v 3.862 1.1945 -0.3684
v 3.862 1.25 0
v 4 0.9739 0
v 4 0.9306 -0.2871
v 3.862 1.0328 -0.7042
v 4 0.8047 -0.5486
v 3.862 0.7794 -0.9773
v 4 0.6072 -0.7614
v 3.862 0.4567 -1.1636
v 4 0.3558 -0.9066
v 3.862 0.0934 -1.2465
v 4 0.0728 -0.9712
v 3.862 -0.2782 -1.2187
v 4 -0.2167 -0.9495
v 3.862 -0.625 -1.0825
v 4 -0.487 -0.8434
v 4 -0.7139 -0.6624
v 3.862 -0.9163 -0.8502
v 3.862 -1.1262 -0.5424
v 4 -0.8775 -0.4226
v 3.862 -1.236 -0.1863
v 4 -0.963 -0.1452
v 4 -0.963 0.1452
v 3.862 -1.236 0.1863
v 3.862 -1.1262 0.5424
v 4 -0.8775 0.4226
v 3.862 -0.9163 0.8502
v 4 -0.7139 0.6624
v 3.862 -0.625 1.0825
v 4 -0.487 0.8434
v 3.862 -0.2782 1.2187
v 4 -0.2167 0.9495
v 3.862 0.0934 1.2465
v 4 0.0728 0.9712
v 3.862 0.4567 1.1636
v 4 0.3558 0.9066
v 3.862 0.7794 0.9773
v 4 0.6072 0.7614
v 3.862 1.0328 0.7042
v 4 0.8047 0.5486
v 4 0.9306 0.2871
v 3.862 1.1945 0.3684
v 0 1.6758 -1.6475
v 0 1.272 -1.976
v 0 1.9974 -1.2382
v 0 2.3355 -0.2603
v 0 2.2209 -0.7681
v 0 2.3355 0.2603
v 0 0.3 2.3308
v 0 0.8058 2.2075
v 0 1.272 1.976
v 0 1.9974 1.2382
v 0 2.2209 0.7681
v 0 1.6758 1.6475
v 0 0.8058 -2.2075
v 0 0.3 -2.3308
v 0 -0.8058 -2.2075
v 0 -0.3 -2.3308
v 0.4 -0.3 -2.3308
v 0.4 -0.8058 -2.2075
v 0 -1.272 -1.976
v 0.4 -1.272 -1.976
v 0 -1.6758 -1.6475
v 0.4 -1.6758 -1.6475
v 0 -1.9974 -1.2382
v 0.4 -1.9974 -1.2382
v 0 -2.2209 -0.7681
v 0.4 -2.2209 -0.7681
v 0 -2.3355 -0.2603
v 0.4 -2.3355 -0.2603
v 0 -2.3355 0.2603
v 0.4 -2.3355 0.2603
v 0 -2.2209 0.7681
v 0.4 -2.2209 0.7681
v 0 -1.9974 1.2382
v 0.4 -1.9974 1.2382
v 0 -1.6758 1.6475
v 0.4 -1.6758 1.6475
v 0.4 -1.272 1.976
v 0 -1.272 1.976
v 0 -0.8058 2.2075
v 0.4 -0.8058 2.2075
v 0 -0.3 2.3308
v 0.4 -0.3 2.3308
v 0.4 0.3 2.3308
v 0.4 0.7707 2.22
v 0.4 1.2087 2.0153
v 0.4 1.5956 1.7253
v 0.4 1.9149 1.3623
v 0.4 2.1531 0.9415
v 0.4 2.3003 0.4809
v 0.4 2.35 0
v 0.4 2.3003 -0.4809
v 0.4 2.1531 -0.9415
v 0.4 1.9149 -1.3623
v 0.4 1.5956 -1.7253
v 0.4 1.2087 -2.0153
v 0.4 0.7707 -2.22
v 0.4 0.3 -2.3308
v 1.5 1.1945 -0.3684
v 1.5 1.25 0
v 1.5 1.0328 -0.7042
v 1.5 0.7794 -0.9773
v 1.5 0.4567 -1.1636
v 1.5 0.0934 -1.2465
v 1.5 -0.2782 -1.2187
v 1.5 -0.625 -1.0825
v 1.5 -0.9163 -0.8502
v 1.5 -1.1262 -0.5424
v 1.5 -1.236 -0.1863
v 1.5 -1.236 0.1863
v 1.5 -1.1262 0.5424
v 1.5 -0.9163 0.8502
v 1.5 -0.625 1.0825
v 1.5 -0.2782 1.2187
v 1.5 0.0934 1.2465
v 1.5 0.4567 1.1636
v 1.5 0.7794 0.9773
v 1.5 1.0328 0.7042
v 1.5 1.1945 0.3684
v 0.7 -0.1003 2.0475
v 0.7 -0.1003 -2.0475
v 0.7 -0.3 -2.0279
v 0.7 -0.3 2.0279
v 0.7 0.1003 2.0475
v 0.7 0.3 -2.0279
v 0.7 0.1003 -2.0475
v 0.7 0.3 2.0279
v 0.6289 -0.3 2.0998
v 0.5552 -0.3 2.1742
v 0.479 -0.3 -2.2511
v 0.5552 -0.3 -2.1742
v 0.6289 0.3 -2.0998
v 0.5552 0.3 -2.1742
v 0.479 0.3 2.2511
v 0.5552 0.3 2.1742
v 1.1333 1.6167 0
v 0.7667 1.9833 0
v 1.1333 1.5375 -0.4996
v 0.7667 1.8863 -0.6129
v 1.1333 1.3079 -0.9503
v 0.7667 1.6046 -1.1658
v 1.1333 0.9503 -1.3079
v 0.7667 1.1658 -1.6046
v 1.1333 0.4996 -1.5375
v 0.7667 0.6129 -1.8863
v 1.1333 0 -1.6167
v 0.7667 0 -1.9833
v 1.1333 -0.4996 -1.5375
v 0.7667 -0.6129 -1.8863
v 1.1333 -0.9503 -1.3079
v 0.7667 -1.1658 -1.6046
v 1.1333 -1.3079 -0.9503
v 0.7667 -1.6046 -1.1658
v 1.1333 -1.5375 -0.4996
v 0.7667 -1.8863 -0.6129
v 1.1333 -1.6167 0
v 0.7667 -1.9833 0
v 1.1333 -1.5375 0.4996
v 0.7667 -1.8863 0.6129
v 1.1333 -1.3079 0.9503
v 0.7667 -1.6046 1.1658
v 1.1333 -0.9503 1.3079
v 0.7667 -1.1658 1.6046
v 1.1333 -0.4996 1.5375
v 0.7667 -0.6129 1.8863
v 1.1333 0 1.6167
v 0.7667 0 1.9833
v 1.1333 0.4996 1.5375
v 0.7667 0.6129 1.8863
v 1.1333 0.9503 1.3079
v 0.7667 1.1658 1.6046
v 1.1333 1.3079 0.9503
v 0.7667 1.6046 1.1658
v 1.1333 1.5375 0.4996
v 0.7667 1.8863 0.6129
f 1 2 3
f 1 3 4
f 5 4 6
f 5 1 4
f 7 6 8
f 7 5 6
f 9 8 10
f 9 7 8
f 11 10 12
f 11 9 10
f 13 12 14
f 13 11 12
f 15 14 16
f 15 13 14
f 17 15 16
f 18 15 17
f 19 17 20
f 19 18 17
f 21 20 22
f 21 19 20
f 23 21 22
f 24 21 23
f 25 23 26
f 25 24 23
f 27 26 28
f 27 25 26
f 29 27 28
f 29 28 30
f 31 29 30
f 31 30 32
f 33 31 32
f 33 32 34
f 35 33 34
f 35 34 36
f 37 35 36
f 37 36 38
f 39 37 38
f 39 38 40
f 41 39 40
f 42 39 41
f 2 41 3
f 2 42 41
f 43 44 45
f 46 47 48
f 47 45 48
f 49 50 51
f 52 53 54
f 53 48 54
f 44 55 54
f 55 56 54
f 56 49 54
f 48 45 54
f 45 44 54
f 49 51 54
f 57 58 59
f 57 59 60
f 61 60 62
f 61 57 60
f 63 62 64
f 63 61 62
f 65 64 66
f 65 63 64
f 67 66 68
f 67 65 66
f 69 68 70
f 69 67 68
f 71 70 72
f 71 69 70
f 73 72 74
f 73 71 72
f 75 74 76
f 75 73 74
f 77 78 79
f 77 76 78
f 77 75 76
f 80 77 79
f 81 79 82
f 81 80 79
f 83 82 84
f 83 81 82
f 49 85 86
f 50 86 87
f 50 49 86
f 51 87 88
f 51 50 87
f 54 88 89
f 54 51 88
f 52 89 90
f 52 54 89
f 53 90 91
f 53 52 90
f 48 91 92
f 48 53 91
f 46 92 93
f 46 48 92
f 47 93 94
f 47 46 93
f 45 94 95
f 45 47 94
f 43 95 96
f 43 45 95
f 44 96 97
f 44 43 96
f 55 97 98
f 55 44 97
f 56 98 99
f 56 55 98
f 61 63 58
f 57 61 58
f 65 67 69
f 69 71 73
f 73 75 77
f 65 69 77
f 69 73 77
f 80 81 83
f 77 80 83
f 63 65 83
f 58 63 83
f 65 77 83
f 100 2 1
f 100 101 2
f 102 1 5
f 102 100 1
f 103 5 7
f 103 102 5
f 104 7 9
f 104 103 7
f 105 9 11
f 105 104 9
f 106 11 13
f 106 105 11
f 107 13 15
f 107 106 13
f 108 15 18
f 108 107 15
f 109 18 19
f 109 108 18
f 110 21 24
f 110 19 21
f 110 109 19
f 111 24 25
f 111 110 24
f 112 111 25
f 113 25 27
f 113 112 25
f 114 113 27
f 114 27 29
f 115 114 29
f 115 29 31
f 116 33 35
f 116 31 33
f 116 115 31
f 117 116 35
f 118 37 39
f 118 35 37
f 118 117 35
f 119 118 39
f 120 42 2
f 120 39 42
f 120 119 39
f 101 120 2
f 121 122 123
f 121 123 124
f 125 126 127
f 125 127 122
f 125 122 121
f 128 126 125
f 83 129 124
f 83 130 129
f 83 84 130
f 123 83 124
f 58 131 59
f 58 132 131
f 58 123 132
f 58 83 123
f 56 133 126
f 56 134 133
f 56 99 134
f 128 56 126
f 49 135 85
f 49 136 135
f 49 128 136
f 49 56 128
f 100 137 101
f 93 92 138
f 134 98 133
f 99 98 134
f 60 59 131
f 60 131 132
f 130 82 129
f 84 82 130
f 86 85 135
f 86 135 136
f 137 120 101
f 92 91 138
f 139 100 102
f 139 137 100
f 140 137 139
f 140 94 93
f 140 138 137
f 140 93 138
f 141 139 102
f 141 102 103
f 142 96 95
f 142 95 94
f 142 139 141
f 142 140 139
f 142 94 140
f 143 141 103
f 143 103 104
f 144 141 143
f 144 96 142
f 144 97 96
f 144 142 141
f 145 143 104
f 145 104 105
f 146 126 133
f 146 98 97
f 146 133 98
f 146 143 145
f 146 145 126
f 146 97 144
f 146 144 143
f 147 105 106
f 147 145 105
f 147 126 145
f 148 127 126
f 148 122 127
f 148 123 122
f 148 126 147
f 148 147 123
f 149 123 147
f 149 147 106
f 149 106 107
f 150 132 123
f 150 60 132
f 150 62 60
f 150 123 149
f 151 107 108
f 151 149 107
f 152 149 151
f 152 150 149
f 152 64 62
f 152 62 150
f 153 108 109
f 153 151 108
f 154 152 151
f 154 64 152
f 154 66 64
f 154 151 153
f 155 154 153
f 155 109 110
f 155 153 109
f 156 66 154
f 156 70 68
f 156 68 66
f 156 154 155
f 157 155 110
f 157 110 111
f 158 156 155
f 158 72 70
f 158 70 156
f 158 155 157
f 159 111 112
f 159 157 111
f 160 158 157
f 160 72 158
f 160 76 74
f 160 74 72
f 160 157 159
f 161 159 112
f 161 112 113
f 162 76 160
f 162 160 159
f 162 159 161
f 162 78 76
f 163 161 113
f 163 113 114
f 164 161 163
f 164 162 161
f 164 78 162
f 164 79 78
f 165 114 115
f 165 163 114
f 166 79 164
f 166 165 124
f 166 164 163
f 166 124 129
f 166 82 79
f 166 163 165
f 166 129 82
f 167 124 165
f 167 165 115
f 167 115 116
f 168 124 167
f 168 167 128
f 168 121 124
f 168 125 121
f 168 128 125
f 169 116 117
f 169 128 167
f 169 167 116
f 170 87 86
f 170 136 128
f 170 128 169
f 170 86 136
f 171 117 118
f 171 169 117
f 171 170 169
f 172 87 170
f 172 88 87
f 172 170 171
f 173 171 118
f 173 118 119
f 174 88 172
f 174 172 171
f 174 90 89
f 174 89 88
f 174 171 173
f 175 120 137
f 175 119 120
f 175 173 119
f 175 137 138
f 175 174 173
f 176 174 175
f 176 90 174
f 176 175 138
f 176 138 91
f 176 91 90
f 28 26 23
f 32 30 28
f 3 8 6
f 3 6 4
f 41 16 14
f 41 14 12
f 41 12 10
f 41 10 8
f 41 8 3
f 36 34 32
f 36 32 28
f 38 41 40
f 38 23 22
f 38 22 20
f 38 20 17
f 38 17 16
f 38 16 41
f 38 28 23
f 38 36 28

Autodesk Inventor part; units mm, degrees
ref_plane "YZ Plane" through (0, 0, 0) normal (1, 0, 0) x (0, 1, 0)
ref_plane "XZ Plane" through (0, 0, 0) normal (0, 1, 0) x (-1, 0, 0)
sketch "Sketch1" plane through (0, 0, 0) normal (0, 0, 1) x (1, 0, 0)
  line L0 (0, 0) -> (4, 0)
  line L1 (4, 0) -> (4, 1.25)
  line L2 (4, 1.25) -> (2.4, 1.25)
  line L3 (2.4, 1.25) -> (2.1239, 1.25)
  line L4 (2.1239, 1.25) -> (1.5, 1.25)
  line L5 (1.5, 1.25) -> (0.4, 2.35)
  line L6 (0.4, 2.35) -> (0, 2.35)
  line L7 (0, 2.35) -> (0, 0)
  line L8 (2.4, 1.25) -> (1.5, 1.25) construction
  line L9 (-0.8, 0) -> (4.8, 0) projected
  line L10 (0, 2.82) -> (0, -0.47) projected
  dimension "d0" = 4
  dimension "d1" = 45
  dimension "d2" = 0.2761
  dimension "d3" = 1.6
  dimension "d4" = 1.5
  dimension "d5" = 2.5
  dimension "d6" = 2.5
  dimension "d7" = 4.7
revolve "Body" add sketch "Sketch1" angle 360 about axis through (0, 0, 0) along (1, 0, 0)
sketch "Sketch2" plane through (0, 0, 0) normal (-1, 0, 0) x (0, 0, 1)
  line L0 (2.35, -0.3) -> (-2.35, -0.3)
  line L1 (-2.35, -0.3) -> (-2.35, 0.3)
  line L2 (-2.35, 0.3) -> (2.35, 0.3)
  line L3 (2.35, 0.3) -> (2.35, -0.3)
  line L4 (0, 0.3) -> (0, -0.3) construction
  line L5 (-2.35, 0) -> (2.35, 0) construction
  line L6 (0, 2.35) -> (0, 0) projected
  dimension "d15" = 0.6
  dimension "d16" = 4.7
extrude "Slot" cut sketch "Sketch2" against normal blind 0.7
thread "Thread" size "M2.5x0.45" class "6g" standard "ISO Metric profile" length 1.6
chamfer "Chamfer1" distance 0.2761 distance2 0.138 1 edges at (4, -1.25, 0) measured on face at (4, -0.3689, 0.1936)
ref_plane "Work Plane1" through (33.575, 0, 0) normal (0, 0, -1) x (1, 0, 0)
equation "\"d0\" = NLG"
equation "\"d1\" = 0.5 * SEWI"
equation "\"d2\" = GAL"
equation "\"d3\" = GEL"
equation "\"d4\" = KOH"
equation "\"d5\" = BDM"
equation "\"d6\" = GD"
equation "\"d7\" = KOD"
equation "\"d15\" = SBR"
equation "\"d16\" = KOD"
equation "\"d8\" = STI"
equation "\"d10\" = GEL"
equation "\"d12\" = -0.5 * SPD + 0.5 * GD"
equation "\"d13\" = 0.5 * GAL"
equation "\"NLG\" = 4"
equation "\"GAL\" = 0.61345 * PTC"
equation "\"GEL\" = 1.6"
equation "\"KOH\" = 1.5"
equation "\"KOD\" = 4.7"
equation "\"SEWI\" = 90deg"
equation "\"BDM\" = NND"
equation "\"GD\" = NND"
equation "\"SBR\" = 0.6"
equation "\"STI\" = 0.7"
equation "\"SPD\" = NND - 1.2269 * PTC"
equation "\"GUL\" = 0.61345 * PTC"
equation "\"PTC\" = 0.45"
equation "\"EPV\" = 2.75"
equation "\"THREADDIA\" = 2.5"
equation "\"TOA\" = 30deg"
equation "\"NND\" = 2.5"
equation "\"GD1\" = THREADDIA - 1.2269 * PTC"
properties part number "DIN 963 - M2.5 x 4" material "Steel, Mild"
